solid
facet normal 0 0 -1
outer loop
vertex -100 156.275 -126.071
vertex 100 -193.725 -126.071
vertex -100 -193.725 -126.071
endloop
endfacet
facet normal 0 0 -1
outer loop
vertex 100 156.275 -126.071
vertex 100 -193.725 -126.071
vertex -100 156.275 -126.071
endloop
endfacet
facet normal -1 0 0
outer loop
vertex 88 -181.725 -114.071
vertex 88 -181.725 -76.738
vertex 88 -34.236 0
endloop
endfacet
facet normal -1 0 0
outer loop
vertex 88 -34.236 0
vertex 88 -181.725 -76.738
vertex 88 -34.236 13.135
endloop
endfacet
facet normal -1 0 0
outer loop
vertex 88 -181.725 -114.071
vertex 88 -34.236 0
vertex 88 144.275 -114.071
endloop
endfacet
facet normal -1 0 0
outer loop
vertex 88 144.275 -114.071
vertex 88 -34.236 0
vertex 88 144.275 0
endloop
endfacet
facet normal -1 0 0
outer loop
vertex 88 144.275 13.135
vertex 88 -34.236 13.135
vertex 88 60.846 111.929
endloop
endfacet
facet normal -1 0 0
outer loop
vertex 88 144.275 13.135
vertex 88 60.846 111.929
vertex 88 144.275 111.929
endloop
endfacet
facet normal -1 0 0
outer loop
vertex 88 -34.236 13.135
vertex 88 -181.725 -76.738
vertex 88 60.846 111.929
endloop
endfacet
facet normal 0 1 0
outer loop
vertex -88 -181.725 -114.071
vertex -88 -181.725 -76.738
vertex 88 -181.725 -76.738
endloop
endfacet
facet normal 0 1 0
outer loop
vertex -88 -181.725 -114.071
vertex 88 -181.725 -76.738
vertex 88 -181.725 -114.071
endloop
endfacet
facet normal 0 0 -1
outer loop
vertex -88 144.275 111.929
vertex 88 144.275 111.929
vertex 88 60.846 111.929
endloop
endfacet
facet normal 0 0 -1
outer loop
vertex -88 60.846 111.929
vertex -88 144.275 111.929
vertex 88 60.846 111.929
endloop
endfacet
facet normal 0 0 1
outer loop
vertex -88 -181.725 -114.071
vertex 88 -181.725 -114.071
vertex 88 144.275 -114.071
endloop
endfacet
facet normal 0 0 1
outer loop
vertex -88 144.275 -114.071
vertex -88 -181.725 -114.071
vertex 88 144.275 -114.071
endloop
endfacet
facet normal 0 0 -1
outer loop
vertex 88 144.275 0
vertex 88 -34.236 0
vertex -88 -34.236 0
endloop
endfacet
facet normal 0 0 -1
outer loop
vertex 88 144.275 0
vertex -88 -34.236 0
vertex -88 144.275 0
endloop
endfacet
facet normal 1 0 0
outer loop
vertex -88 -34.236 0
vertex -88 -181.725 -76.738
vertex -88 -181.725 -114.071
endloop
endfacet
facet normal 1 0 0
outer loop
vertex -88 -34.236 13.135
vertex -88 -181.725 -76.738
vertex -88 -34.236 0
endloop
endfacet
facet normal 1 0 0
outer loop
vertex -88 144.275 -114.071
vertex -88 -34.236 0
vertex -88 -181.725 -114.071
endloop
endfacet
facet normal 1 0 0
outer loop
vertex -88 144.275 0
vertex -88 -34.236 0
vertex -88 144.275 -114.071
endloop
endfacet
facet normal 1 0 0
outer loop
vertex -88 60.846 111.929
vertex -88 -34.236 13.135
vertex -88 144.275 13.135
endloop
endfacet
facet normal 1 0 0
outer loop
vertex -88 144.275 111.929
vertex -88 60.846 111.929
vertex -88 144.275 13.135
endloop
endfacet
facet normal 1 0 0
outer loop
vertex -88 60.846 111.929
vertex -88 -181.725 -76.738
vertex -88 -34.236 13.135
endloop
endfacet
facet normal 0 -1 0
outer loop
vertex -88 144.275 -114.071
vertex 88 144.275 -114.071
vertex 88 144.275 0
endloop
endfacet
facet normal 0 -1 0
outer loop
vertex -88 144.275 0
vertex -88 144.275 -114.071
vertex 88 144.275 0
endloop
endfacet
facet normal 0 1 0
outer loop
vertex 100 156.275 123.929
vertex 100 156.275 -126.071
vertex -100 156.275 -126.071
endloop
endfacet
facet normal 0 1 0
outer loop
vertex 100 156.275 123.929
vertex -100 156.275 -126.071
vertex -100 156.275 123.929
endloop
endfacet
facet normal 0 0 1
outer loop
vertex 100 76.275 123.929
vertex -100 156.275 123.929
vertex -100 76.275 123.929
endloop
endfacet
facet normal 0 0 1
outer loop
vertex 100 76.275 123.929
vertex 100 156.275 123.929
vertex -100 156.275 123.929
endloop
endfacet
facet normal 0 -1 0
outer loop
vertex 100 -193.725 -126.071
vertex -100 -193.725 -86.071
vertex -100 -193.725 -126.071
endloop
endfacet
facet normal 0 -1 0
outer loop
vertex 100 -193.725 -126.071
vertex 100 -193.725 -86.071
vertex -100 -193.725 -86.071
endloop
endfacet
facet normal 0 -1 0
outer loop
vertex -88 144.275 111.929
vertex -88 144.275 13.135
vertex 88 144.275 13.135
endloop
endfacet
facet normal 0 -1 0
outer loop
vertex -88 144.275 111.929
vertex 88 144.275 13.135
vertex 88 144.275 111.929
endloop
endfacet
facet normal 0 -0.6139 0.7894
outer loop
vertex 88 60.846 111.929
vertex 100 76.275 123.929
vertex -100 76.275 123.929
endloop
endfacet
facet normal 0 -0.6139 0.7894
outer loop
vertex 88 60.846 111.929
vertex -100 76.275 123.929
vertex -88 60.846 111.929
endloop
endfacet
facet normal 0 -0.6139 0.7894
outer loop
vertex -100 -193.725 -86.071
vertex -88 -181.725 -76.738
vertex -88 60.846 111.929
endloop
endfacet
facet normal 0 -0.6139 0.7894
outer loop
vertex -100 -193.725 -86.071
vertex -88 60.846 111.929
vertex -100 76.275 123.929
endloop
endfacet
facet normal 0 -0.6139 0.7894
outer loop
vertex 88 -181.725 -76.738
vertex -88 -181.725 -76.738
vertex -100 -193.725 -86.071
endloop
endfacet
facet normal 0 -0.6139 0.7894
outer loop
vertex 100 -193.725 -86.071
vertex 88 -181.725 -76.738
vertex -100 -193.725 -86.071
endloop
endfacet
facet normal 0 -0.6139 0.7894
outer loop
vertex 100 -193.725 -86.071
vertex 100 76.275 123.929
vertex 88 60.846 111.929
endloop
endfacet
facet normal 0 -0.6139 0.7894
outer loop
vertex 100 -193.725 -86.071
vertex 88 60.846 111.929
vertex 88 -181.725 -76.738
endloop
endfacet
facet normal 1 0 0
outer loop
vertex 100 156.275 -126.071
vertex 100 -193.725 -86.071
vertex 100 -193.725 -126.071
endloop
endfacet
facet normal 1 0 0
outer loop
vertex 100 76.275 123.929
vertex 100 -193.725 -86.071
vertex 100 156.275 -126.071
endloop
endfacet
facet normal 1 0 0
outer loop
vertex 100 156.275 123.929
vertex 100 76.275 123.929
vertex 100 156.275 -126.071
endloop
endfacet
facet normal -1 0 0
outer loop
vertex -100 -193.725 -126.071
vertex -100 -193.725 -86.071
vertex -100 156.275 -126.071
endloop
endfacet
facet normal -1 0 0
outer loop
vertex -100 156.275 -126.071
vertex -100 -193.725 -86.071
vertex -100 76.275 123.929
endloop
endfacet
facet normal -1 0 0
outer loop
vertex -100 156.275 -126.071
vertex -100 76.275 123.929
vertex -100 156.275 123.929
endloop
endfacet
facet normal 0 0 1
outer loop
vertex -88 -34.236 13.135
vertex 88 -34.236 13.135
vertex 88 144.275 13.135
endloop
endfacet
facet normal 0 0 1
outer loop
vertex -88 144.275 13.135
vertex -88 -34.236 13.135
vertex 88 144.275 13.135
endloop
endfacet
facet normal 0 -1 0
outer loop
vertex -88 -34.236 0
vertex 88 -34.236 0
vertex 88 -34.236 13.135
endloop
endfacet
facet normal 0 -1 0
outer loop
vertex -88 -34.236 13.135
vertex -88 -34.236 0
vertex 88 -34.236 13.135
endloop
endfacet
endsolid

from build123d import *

# Parameters (mm, degrees)
F1_DEPTH = 100
F2_T     = -12
F4_W     = 187.6861900091
F4_H     = 13.1353894249
F5_DEPTH = 200


with BuildPart() as f1:
    # F0 (on Right) → F1 (new body, symmetric)
    with BuildSketch(Plane.YZ):
        Polygon((-193.7253567732, -86.0714143496), (-193.7253567732, -126.0714143496), (156.2746432268, -126.0714143496), (156.2746432268, 123.9285856504), (76.2746432268, 123.9285856504), align=None)
    extrude(amount=F1_DEPTH, both=True)

    # F2
    f2_openings = [f1.faces().sort_by_distance(p)[0] for p in [
        (0, -58.725357, 18.928586),
    ]]
    offset(amount=F2_T, openings=f2_openings)

    # F4 (on face) → F5 (join)
    with BuildSketch(Plane.YZ.offset(100)):
        with Locations((59.6075579524, 6.5676947124)):
            Rectangle(F4_W, F4_H)
    extrude(amount=-F5_DEPTH)


solid = f1.part
